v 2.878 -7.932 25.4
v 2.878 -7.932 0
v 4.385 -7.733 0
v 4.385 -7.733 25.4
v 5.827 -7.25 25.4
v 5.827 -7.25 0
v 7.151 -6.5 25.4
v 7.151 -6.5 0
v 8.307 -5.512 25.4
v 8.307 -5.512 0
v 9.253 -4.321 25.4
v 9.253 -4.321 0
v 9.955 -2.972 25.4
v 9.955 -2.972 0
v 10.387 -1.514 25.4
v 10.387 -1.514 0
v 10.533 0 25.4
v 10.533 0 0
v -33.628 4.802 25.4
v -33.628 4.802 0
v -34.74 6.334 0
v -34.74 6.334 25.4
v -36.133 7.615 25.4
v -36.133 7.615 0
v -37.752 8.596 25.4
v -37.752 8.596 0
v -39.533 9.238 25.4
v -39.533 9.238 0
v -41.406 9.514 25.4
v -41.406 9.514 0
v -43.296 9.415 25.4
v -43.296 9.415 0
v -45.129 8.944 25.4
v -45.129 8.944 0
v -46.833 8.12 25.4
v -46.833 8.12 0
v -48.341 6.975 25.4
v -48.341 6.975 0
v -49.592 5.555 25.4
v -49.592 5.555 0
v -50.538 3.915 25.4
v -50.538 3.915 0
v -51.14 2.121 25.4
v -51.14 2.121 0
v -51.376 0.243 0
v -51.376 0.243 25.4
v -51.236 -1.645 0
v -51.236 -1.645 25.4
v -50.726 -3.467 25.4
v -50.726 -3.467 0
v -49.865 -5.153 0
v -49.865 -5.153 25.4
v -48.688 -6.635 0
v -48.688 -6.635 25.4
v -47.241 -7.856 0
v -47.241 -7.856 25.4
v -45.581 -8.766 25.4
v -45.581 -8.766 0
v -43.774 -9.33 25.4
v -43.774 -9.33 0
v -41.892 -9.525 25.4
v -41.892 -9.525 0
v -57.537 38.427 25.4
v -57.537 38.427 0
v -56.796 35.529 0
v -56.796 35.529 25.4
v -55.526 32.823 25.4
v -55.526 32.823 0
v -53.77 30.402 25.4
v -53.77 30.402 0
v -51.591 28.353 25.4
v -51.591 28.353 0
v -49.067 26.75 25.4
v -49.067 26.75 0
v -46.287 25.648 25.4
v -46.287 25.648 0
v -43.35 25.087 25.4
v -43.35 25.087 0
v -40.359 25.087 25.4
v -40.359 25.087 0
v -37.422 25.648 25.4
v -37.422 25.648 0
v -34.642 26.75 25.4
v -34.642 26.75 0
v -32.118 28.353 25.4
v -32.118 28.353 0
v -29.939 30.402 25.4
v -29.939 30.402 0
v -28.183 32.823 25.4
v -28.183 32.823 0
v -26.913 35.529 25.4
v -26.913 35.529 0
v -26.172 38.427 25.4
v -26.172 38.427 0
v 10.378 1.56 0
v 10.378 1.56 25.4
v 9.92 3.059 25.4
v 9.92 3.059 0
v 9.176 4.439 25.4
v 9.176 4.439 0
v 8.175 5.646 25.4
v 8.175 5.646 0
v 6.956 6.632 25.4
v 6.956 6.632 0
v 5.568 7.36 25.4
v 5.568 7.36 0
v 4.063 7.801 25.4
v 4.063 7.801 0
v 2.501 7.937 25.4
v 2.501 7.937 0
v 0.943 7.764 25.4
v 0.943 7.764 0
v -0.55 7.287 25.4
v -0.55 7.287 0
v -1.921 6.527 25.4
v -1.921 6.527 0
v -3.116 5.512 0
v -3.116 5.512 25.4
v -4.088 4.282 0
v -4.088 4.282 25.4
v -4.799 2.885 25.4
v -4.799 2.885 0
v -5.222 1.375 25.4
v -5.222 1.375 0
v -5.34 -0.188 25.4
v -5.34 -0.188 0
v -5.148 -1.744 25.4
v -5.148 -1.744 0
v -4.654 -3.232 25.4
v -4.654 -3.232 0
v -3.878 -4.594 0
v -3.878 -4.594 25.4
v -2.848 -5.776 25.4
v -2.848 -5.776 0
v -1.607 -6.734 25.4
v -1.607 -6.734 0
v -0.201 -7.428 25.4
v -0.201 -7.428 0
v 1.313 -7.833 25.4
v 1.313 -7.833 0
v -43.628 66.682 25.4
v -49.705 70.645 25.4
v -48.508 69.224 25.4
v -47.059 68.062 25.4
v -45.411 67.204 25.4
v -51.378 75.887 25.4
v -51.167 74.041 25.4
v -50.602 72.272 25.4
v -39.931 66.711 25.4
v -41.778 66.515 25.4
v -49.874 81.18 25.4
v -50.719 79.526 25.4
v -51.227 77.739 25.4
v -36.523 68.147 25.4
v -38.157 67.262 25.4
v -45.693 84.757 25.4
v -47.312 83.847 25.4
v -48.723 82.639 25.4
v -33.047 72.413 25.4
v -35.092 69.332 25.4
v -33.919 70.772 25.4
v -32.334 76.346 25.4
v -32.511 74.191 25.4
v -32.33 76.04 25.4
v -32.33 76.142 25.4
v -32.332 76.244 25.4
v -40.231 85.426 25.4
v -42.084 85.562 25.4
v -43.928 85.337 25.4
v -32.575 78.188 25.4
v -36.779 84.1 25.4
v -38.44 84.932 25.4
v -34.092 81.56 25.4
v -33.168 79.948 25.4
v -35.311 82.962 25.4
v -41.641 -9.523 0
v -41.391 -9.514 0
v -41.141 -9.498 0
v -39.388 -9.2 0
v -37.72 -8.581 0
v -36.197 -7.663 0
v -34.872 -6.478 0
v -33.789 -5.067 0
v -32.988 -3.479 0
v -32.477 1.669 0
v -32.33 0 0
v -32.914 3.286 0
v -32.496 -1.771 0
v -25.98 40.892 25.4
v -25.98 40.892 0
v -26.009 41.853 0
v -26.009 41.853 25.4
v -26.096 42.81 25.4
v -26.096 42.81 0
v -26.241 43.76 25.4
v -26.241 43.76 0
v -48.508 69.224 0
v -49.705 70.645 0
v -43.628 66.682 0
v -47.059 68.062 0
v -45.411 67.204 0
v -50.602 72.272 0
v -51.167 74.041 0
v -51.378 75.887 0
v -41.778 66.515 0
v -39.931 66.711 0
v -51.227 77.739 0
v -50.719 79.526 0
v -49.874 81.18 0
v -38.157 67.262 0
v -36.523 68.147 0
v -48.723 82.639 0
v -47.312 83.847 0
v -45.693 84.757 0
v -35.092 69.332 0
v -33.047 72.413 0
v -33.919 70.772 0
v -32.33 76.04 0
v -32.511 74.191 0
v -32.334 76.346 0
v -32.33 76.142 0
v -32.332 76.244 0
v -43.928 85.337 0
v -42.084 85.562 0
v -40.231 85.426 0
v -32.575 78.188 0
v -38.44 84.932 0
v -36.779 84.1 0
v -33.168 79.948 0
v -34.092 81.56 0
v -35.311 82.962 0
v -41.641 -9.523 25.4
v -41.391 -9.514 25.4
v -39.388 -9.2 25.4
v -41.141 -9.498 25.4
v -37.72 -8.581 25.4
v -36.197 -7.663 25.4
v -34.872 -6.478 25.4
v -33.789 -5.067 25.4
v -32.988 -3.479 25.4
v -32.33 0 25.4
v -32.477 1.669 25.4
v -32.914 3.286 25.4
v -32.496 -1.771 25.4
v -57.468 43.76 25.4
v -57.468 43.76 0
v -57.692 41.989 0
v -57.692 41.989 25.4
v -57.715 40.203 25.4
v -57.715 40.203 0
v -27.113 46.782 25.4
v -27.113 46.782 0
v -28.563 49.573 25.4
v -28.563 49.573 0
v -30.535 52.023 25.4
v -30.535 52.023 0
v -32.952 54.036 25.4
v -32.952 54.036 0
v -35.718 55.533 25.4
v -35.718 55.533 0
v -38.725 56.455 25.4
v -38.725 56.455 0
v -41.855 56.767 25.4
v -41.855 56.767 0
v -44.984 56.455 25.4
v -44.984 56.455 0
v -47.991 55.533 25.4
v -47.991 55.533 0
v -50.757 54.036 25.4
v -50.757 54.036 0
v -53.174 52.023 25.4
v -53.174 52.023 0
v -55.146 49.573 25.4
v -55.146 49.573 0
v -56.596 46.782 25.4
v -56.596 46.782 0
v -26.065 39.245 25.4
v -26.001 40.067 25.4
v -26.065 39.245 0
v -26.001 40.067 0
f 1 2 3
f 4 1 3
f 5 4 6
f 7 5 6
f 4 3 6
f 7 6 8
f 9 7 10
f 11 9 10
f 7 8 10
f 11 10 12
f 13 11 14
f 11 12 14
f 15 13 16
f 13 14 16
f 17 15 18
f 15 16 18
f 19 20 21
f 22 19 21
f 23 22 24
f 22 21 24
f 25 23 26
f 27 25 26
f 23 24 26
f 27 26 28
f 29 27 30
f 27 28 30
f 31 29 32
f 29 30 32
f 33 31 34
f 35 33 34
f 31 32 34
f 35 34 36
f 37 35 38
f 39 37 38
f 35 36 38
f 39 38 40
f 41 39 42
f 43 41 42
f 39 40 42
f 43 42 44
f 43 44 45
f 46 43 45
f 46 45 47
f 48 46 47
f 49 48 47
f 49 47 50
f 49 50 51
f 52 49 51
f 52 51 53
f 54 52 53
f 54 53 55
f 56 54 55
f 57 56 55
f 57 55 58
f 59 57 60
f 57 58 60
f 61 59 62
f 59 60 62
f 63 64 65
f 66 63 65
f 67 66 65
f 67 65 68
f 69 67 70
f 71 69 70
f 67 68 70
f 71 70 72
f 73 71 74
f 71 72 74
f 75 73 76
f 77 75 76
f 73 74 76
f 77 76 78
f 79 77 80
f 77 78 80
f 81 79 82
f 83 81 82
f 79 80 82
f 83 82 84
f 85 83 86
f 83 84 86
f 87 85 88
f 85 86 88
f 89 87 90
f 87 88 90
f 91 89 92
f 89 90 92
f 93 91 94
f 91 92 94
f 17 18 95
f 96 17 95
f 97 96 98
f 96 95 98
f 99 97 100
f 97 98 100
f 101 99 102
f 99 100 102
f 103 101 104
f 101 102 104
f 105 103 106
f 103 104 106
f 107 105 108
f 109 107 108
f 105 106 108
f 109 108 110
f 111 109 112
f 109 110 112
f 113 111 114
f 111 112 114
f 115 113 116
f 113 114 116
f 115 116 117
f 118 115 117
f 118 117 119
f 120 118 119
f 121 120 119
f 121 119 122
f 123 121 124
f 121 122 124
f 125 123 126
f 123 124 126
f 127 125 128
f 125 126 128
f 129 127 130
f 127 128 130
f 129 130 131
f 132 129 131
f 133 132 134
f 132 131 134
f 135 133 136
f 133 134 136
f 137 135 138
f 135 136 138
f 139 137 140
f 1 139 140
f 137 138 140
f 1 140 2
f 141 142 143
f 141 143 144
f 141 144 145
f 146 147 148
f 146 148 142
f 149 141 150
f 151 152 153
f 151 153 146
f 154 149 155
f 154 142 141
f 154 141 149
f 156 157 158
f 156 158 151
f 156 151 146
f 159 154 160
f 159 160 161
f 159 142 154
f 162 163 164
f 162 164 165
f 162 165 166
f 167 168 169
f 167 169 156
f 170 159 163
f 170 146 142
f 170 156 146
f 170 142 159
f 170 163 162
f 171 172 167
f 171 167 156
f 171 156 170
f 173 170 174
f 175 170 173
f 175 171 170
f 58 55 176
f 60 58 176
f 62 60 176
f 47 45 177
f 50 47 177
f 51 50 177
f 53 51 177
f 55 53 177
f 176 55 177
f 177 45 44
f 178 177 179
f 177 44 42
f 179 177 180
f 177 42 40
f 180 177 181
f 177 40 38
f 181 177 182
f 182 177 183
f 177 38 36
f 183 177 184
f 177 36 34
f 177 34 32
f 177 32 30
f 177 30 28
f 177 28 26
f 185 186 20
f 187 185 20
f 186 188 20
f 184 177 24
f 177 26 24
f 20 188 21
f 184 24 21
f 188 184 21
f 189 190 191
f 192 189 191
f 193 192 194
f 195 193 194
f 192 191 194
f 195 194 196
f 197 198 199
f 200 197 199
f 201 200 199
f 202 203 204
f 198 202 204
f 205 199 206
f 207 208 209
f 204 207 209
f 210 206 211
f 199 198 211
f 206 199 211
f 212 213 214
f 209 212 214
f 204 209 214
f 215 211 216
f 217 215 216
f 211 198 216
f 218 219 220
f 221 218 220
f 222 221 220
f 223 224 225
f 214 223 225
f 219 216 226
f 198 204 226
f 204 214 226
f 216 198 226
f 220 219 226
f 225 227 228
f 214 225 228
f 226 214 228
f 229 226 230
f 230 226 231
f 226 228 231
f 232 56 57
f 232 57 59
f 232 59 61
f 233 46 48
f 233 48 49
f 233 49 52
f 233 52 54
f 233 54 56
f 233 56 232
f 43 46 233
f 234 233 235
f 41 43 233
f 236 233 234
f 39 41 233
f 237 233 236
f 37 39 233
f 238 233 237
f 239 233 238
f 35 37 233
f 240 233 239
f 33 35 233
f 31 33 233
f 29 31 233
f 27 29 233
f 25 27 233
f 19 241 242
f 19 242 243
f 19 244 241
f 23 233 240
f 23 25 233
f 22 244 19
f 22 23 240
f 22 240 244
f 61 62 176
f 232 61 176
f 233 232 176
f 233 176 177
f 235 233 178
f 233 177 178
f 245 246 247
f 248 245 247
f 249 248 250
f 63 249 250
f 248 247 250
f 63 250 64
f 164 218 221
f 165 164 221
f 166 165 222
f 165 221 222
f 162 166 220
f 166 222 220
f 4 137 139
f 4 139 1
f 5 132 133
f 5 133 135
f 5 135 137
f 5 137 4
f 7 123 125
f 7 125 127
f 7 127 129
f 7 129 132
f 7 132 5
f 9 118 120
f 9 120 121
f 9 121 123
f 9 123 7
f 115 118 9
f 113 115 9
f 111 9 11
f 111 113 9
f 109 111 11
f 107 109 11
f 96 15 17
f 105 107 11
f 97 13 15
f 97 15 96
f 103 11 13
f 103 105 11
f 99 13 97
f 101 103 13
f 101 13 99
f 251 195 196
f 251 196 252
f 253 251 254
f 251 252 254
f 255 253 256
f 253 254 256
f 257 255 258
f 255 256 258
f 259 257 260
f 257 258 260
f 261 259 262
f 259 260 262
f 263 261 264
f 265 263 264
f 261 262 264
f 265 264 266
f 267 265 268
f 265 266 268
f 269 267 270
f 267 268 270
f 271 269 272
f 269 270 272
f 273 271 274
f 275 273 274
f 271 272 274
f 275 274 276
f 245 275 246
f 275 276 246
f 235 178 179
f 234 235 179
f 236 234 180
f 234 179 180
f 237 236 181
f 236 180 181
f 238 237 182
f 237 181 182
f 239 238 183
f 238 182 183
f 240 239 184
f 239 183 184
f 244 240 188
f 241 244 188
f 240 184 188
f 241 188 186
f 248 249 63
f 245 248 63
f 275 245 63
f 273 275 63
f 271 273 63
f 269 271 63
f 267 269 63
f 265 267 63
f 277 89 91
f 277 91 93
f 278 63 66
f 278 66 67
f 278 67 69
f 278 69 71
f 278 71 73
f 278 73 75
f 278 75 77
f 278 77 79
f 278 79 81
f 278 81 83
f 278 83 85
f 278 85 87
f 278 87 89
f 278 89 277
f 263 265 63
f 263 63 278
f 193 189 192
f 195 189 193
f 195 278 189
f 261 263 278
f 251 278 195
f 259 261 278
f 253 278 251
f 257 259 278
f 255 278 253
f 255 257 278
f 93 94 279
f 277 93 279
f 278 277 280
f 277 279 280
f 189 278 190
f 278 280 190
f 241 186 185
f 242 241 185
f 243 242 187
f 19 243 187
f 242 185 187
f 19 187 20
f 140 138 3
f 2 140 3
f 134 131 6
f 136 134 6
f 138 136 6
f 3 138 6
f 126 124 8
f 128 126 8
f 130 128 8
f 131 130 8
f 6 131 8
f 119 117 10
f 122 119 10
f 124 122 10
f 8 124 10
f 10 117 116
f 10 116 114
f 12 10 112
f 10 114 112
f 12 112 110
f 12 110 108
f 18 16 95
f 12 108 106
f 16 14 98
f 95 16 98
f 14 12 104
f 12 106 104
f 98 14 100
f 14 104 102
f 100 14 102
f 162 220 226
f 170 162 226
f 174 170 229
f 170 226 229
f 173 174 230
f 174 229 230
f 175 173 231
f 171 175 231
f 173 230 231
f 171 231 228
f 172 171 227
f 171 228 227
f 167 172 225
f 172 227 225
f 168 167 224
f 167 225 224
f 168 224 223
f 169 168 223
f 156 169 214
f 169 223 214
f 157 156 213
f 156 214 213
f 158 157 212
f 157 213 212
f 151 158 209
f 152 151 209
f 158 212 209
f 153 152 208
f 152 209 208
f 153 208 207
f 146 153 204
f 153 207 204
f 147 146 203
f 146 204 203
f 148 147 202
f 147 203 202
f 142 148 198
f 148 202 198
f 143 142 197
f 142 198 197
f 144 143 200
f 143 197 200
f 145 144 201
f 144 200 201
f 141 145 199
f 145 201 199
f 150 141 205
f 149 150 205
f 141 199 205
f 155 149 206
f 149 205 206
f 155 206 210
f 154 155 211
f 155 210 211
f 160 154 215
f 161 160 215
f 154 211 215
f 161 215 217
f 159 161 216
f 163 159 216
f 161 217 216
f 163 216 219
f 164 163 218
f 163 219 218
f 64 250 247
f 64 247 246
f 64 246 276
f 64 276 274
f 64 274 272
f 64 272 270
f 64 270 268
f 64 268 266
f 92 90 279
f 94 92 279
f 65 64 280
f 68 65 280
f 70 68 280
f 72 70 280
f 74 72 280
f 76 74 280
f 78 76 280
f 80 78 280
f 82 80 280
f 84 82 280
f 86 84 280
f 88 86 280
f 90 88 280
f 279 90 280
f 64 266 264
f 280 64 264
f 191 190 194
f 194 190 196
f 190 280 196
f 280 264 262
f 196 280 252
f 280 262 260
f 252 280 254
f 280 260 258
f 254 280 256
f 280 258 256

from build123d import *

# Parameters (mm, degrees)
F1_DEPTH = 25.4


with BuildPart() as f1:
    # F0 (on Top) → F1 (new body)
    with BuildSketch(Plane.XY):
        with BuildLine():
            ThreePointArc((-32.334431, 76.345818), (-51.378296, 75.887214), (-32.329523, 76.040095))
            ThreePointArc((-32.329523, 76.040095), (-32.33075, 76.192976), (-32.334431, 76.345818))
        make_face()
        with BuildLine():
            ThreePointArc((-25.979523, 40.891897), (-26.044963, 42.331843), (-26.240744, 43.759917))
            ThreePointArc((-26.240744, 43.759917), (-41.854515, 56.766897), (-57.468299, 43.759932))
            ThreePointArc((-57.468299, 43.759932), (-57.728208, 41.096224), (-57.536948, 38.426708))
            ThreePointArc((-57.536948, 38.426708), (-41.854523, 25.016897), (-26.172097, 38.426708))
            ThreePointArc((-26.172097, 38.426708), (-26.02774, 39.655547), (-25.979523, 40.891897))
        make_face()
        with BuildLine():
            ThreePointArc((10.532977, 0), (-3.11607, 5.511999), (2.877636, -7.932483))
            ThreePointArc((2.877636, -7.932483), (8.307024, -5.511999), (10.532977, 0))
        make_face()
        with BuildLine():
            ThreePointArc((-32.329523, 0), (-32.66, 2.487243), (-33.6285, 4.801892))
            ThreePointArc((-33.6285, 4.801892), (-50.105519, 4.758853), (-41.891651, -9.524928))
            Line((-41.891651, -9.524928), (-41.140741, -9.498218))
            ThreePointArc((-41.140741, -9.498218), (-34.871529, -6.477918), (-32.329523, 0))
        make_face()
        with BuildLine():
            Line((-41.140741, -9.498218), (-41.891651, -9.524928))
            ThreePointArc((-41.891651, -9.524928), (-41.515933, -9.51898), (-41.140741, -9.498218))
        make_face()
    extrude(amount=F1_DEPTH)


solid = f1.part
